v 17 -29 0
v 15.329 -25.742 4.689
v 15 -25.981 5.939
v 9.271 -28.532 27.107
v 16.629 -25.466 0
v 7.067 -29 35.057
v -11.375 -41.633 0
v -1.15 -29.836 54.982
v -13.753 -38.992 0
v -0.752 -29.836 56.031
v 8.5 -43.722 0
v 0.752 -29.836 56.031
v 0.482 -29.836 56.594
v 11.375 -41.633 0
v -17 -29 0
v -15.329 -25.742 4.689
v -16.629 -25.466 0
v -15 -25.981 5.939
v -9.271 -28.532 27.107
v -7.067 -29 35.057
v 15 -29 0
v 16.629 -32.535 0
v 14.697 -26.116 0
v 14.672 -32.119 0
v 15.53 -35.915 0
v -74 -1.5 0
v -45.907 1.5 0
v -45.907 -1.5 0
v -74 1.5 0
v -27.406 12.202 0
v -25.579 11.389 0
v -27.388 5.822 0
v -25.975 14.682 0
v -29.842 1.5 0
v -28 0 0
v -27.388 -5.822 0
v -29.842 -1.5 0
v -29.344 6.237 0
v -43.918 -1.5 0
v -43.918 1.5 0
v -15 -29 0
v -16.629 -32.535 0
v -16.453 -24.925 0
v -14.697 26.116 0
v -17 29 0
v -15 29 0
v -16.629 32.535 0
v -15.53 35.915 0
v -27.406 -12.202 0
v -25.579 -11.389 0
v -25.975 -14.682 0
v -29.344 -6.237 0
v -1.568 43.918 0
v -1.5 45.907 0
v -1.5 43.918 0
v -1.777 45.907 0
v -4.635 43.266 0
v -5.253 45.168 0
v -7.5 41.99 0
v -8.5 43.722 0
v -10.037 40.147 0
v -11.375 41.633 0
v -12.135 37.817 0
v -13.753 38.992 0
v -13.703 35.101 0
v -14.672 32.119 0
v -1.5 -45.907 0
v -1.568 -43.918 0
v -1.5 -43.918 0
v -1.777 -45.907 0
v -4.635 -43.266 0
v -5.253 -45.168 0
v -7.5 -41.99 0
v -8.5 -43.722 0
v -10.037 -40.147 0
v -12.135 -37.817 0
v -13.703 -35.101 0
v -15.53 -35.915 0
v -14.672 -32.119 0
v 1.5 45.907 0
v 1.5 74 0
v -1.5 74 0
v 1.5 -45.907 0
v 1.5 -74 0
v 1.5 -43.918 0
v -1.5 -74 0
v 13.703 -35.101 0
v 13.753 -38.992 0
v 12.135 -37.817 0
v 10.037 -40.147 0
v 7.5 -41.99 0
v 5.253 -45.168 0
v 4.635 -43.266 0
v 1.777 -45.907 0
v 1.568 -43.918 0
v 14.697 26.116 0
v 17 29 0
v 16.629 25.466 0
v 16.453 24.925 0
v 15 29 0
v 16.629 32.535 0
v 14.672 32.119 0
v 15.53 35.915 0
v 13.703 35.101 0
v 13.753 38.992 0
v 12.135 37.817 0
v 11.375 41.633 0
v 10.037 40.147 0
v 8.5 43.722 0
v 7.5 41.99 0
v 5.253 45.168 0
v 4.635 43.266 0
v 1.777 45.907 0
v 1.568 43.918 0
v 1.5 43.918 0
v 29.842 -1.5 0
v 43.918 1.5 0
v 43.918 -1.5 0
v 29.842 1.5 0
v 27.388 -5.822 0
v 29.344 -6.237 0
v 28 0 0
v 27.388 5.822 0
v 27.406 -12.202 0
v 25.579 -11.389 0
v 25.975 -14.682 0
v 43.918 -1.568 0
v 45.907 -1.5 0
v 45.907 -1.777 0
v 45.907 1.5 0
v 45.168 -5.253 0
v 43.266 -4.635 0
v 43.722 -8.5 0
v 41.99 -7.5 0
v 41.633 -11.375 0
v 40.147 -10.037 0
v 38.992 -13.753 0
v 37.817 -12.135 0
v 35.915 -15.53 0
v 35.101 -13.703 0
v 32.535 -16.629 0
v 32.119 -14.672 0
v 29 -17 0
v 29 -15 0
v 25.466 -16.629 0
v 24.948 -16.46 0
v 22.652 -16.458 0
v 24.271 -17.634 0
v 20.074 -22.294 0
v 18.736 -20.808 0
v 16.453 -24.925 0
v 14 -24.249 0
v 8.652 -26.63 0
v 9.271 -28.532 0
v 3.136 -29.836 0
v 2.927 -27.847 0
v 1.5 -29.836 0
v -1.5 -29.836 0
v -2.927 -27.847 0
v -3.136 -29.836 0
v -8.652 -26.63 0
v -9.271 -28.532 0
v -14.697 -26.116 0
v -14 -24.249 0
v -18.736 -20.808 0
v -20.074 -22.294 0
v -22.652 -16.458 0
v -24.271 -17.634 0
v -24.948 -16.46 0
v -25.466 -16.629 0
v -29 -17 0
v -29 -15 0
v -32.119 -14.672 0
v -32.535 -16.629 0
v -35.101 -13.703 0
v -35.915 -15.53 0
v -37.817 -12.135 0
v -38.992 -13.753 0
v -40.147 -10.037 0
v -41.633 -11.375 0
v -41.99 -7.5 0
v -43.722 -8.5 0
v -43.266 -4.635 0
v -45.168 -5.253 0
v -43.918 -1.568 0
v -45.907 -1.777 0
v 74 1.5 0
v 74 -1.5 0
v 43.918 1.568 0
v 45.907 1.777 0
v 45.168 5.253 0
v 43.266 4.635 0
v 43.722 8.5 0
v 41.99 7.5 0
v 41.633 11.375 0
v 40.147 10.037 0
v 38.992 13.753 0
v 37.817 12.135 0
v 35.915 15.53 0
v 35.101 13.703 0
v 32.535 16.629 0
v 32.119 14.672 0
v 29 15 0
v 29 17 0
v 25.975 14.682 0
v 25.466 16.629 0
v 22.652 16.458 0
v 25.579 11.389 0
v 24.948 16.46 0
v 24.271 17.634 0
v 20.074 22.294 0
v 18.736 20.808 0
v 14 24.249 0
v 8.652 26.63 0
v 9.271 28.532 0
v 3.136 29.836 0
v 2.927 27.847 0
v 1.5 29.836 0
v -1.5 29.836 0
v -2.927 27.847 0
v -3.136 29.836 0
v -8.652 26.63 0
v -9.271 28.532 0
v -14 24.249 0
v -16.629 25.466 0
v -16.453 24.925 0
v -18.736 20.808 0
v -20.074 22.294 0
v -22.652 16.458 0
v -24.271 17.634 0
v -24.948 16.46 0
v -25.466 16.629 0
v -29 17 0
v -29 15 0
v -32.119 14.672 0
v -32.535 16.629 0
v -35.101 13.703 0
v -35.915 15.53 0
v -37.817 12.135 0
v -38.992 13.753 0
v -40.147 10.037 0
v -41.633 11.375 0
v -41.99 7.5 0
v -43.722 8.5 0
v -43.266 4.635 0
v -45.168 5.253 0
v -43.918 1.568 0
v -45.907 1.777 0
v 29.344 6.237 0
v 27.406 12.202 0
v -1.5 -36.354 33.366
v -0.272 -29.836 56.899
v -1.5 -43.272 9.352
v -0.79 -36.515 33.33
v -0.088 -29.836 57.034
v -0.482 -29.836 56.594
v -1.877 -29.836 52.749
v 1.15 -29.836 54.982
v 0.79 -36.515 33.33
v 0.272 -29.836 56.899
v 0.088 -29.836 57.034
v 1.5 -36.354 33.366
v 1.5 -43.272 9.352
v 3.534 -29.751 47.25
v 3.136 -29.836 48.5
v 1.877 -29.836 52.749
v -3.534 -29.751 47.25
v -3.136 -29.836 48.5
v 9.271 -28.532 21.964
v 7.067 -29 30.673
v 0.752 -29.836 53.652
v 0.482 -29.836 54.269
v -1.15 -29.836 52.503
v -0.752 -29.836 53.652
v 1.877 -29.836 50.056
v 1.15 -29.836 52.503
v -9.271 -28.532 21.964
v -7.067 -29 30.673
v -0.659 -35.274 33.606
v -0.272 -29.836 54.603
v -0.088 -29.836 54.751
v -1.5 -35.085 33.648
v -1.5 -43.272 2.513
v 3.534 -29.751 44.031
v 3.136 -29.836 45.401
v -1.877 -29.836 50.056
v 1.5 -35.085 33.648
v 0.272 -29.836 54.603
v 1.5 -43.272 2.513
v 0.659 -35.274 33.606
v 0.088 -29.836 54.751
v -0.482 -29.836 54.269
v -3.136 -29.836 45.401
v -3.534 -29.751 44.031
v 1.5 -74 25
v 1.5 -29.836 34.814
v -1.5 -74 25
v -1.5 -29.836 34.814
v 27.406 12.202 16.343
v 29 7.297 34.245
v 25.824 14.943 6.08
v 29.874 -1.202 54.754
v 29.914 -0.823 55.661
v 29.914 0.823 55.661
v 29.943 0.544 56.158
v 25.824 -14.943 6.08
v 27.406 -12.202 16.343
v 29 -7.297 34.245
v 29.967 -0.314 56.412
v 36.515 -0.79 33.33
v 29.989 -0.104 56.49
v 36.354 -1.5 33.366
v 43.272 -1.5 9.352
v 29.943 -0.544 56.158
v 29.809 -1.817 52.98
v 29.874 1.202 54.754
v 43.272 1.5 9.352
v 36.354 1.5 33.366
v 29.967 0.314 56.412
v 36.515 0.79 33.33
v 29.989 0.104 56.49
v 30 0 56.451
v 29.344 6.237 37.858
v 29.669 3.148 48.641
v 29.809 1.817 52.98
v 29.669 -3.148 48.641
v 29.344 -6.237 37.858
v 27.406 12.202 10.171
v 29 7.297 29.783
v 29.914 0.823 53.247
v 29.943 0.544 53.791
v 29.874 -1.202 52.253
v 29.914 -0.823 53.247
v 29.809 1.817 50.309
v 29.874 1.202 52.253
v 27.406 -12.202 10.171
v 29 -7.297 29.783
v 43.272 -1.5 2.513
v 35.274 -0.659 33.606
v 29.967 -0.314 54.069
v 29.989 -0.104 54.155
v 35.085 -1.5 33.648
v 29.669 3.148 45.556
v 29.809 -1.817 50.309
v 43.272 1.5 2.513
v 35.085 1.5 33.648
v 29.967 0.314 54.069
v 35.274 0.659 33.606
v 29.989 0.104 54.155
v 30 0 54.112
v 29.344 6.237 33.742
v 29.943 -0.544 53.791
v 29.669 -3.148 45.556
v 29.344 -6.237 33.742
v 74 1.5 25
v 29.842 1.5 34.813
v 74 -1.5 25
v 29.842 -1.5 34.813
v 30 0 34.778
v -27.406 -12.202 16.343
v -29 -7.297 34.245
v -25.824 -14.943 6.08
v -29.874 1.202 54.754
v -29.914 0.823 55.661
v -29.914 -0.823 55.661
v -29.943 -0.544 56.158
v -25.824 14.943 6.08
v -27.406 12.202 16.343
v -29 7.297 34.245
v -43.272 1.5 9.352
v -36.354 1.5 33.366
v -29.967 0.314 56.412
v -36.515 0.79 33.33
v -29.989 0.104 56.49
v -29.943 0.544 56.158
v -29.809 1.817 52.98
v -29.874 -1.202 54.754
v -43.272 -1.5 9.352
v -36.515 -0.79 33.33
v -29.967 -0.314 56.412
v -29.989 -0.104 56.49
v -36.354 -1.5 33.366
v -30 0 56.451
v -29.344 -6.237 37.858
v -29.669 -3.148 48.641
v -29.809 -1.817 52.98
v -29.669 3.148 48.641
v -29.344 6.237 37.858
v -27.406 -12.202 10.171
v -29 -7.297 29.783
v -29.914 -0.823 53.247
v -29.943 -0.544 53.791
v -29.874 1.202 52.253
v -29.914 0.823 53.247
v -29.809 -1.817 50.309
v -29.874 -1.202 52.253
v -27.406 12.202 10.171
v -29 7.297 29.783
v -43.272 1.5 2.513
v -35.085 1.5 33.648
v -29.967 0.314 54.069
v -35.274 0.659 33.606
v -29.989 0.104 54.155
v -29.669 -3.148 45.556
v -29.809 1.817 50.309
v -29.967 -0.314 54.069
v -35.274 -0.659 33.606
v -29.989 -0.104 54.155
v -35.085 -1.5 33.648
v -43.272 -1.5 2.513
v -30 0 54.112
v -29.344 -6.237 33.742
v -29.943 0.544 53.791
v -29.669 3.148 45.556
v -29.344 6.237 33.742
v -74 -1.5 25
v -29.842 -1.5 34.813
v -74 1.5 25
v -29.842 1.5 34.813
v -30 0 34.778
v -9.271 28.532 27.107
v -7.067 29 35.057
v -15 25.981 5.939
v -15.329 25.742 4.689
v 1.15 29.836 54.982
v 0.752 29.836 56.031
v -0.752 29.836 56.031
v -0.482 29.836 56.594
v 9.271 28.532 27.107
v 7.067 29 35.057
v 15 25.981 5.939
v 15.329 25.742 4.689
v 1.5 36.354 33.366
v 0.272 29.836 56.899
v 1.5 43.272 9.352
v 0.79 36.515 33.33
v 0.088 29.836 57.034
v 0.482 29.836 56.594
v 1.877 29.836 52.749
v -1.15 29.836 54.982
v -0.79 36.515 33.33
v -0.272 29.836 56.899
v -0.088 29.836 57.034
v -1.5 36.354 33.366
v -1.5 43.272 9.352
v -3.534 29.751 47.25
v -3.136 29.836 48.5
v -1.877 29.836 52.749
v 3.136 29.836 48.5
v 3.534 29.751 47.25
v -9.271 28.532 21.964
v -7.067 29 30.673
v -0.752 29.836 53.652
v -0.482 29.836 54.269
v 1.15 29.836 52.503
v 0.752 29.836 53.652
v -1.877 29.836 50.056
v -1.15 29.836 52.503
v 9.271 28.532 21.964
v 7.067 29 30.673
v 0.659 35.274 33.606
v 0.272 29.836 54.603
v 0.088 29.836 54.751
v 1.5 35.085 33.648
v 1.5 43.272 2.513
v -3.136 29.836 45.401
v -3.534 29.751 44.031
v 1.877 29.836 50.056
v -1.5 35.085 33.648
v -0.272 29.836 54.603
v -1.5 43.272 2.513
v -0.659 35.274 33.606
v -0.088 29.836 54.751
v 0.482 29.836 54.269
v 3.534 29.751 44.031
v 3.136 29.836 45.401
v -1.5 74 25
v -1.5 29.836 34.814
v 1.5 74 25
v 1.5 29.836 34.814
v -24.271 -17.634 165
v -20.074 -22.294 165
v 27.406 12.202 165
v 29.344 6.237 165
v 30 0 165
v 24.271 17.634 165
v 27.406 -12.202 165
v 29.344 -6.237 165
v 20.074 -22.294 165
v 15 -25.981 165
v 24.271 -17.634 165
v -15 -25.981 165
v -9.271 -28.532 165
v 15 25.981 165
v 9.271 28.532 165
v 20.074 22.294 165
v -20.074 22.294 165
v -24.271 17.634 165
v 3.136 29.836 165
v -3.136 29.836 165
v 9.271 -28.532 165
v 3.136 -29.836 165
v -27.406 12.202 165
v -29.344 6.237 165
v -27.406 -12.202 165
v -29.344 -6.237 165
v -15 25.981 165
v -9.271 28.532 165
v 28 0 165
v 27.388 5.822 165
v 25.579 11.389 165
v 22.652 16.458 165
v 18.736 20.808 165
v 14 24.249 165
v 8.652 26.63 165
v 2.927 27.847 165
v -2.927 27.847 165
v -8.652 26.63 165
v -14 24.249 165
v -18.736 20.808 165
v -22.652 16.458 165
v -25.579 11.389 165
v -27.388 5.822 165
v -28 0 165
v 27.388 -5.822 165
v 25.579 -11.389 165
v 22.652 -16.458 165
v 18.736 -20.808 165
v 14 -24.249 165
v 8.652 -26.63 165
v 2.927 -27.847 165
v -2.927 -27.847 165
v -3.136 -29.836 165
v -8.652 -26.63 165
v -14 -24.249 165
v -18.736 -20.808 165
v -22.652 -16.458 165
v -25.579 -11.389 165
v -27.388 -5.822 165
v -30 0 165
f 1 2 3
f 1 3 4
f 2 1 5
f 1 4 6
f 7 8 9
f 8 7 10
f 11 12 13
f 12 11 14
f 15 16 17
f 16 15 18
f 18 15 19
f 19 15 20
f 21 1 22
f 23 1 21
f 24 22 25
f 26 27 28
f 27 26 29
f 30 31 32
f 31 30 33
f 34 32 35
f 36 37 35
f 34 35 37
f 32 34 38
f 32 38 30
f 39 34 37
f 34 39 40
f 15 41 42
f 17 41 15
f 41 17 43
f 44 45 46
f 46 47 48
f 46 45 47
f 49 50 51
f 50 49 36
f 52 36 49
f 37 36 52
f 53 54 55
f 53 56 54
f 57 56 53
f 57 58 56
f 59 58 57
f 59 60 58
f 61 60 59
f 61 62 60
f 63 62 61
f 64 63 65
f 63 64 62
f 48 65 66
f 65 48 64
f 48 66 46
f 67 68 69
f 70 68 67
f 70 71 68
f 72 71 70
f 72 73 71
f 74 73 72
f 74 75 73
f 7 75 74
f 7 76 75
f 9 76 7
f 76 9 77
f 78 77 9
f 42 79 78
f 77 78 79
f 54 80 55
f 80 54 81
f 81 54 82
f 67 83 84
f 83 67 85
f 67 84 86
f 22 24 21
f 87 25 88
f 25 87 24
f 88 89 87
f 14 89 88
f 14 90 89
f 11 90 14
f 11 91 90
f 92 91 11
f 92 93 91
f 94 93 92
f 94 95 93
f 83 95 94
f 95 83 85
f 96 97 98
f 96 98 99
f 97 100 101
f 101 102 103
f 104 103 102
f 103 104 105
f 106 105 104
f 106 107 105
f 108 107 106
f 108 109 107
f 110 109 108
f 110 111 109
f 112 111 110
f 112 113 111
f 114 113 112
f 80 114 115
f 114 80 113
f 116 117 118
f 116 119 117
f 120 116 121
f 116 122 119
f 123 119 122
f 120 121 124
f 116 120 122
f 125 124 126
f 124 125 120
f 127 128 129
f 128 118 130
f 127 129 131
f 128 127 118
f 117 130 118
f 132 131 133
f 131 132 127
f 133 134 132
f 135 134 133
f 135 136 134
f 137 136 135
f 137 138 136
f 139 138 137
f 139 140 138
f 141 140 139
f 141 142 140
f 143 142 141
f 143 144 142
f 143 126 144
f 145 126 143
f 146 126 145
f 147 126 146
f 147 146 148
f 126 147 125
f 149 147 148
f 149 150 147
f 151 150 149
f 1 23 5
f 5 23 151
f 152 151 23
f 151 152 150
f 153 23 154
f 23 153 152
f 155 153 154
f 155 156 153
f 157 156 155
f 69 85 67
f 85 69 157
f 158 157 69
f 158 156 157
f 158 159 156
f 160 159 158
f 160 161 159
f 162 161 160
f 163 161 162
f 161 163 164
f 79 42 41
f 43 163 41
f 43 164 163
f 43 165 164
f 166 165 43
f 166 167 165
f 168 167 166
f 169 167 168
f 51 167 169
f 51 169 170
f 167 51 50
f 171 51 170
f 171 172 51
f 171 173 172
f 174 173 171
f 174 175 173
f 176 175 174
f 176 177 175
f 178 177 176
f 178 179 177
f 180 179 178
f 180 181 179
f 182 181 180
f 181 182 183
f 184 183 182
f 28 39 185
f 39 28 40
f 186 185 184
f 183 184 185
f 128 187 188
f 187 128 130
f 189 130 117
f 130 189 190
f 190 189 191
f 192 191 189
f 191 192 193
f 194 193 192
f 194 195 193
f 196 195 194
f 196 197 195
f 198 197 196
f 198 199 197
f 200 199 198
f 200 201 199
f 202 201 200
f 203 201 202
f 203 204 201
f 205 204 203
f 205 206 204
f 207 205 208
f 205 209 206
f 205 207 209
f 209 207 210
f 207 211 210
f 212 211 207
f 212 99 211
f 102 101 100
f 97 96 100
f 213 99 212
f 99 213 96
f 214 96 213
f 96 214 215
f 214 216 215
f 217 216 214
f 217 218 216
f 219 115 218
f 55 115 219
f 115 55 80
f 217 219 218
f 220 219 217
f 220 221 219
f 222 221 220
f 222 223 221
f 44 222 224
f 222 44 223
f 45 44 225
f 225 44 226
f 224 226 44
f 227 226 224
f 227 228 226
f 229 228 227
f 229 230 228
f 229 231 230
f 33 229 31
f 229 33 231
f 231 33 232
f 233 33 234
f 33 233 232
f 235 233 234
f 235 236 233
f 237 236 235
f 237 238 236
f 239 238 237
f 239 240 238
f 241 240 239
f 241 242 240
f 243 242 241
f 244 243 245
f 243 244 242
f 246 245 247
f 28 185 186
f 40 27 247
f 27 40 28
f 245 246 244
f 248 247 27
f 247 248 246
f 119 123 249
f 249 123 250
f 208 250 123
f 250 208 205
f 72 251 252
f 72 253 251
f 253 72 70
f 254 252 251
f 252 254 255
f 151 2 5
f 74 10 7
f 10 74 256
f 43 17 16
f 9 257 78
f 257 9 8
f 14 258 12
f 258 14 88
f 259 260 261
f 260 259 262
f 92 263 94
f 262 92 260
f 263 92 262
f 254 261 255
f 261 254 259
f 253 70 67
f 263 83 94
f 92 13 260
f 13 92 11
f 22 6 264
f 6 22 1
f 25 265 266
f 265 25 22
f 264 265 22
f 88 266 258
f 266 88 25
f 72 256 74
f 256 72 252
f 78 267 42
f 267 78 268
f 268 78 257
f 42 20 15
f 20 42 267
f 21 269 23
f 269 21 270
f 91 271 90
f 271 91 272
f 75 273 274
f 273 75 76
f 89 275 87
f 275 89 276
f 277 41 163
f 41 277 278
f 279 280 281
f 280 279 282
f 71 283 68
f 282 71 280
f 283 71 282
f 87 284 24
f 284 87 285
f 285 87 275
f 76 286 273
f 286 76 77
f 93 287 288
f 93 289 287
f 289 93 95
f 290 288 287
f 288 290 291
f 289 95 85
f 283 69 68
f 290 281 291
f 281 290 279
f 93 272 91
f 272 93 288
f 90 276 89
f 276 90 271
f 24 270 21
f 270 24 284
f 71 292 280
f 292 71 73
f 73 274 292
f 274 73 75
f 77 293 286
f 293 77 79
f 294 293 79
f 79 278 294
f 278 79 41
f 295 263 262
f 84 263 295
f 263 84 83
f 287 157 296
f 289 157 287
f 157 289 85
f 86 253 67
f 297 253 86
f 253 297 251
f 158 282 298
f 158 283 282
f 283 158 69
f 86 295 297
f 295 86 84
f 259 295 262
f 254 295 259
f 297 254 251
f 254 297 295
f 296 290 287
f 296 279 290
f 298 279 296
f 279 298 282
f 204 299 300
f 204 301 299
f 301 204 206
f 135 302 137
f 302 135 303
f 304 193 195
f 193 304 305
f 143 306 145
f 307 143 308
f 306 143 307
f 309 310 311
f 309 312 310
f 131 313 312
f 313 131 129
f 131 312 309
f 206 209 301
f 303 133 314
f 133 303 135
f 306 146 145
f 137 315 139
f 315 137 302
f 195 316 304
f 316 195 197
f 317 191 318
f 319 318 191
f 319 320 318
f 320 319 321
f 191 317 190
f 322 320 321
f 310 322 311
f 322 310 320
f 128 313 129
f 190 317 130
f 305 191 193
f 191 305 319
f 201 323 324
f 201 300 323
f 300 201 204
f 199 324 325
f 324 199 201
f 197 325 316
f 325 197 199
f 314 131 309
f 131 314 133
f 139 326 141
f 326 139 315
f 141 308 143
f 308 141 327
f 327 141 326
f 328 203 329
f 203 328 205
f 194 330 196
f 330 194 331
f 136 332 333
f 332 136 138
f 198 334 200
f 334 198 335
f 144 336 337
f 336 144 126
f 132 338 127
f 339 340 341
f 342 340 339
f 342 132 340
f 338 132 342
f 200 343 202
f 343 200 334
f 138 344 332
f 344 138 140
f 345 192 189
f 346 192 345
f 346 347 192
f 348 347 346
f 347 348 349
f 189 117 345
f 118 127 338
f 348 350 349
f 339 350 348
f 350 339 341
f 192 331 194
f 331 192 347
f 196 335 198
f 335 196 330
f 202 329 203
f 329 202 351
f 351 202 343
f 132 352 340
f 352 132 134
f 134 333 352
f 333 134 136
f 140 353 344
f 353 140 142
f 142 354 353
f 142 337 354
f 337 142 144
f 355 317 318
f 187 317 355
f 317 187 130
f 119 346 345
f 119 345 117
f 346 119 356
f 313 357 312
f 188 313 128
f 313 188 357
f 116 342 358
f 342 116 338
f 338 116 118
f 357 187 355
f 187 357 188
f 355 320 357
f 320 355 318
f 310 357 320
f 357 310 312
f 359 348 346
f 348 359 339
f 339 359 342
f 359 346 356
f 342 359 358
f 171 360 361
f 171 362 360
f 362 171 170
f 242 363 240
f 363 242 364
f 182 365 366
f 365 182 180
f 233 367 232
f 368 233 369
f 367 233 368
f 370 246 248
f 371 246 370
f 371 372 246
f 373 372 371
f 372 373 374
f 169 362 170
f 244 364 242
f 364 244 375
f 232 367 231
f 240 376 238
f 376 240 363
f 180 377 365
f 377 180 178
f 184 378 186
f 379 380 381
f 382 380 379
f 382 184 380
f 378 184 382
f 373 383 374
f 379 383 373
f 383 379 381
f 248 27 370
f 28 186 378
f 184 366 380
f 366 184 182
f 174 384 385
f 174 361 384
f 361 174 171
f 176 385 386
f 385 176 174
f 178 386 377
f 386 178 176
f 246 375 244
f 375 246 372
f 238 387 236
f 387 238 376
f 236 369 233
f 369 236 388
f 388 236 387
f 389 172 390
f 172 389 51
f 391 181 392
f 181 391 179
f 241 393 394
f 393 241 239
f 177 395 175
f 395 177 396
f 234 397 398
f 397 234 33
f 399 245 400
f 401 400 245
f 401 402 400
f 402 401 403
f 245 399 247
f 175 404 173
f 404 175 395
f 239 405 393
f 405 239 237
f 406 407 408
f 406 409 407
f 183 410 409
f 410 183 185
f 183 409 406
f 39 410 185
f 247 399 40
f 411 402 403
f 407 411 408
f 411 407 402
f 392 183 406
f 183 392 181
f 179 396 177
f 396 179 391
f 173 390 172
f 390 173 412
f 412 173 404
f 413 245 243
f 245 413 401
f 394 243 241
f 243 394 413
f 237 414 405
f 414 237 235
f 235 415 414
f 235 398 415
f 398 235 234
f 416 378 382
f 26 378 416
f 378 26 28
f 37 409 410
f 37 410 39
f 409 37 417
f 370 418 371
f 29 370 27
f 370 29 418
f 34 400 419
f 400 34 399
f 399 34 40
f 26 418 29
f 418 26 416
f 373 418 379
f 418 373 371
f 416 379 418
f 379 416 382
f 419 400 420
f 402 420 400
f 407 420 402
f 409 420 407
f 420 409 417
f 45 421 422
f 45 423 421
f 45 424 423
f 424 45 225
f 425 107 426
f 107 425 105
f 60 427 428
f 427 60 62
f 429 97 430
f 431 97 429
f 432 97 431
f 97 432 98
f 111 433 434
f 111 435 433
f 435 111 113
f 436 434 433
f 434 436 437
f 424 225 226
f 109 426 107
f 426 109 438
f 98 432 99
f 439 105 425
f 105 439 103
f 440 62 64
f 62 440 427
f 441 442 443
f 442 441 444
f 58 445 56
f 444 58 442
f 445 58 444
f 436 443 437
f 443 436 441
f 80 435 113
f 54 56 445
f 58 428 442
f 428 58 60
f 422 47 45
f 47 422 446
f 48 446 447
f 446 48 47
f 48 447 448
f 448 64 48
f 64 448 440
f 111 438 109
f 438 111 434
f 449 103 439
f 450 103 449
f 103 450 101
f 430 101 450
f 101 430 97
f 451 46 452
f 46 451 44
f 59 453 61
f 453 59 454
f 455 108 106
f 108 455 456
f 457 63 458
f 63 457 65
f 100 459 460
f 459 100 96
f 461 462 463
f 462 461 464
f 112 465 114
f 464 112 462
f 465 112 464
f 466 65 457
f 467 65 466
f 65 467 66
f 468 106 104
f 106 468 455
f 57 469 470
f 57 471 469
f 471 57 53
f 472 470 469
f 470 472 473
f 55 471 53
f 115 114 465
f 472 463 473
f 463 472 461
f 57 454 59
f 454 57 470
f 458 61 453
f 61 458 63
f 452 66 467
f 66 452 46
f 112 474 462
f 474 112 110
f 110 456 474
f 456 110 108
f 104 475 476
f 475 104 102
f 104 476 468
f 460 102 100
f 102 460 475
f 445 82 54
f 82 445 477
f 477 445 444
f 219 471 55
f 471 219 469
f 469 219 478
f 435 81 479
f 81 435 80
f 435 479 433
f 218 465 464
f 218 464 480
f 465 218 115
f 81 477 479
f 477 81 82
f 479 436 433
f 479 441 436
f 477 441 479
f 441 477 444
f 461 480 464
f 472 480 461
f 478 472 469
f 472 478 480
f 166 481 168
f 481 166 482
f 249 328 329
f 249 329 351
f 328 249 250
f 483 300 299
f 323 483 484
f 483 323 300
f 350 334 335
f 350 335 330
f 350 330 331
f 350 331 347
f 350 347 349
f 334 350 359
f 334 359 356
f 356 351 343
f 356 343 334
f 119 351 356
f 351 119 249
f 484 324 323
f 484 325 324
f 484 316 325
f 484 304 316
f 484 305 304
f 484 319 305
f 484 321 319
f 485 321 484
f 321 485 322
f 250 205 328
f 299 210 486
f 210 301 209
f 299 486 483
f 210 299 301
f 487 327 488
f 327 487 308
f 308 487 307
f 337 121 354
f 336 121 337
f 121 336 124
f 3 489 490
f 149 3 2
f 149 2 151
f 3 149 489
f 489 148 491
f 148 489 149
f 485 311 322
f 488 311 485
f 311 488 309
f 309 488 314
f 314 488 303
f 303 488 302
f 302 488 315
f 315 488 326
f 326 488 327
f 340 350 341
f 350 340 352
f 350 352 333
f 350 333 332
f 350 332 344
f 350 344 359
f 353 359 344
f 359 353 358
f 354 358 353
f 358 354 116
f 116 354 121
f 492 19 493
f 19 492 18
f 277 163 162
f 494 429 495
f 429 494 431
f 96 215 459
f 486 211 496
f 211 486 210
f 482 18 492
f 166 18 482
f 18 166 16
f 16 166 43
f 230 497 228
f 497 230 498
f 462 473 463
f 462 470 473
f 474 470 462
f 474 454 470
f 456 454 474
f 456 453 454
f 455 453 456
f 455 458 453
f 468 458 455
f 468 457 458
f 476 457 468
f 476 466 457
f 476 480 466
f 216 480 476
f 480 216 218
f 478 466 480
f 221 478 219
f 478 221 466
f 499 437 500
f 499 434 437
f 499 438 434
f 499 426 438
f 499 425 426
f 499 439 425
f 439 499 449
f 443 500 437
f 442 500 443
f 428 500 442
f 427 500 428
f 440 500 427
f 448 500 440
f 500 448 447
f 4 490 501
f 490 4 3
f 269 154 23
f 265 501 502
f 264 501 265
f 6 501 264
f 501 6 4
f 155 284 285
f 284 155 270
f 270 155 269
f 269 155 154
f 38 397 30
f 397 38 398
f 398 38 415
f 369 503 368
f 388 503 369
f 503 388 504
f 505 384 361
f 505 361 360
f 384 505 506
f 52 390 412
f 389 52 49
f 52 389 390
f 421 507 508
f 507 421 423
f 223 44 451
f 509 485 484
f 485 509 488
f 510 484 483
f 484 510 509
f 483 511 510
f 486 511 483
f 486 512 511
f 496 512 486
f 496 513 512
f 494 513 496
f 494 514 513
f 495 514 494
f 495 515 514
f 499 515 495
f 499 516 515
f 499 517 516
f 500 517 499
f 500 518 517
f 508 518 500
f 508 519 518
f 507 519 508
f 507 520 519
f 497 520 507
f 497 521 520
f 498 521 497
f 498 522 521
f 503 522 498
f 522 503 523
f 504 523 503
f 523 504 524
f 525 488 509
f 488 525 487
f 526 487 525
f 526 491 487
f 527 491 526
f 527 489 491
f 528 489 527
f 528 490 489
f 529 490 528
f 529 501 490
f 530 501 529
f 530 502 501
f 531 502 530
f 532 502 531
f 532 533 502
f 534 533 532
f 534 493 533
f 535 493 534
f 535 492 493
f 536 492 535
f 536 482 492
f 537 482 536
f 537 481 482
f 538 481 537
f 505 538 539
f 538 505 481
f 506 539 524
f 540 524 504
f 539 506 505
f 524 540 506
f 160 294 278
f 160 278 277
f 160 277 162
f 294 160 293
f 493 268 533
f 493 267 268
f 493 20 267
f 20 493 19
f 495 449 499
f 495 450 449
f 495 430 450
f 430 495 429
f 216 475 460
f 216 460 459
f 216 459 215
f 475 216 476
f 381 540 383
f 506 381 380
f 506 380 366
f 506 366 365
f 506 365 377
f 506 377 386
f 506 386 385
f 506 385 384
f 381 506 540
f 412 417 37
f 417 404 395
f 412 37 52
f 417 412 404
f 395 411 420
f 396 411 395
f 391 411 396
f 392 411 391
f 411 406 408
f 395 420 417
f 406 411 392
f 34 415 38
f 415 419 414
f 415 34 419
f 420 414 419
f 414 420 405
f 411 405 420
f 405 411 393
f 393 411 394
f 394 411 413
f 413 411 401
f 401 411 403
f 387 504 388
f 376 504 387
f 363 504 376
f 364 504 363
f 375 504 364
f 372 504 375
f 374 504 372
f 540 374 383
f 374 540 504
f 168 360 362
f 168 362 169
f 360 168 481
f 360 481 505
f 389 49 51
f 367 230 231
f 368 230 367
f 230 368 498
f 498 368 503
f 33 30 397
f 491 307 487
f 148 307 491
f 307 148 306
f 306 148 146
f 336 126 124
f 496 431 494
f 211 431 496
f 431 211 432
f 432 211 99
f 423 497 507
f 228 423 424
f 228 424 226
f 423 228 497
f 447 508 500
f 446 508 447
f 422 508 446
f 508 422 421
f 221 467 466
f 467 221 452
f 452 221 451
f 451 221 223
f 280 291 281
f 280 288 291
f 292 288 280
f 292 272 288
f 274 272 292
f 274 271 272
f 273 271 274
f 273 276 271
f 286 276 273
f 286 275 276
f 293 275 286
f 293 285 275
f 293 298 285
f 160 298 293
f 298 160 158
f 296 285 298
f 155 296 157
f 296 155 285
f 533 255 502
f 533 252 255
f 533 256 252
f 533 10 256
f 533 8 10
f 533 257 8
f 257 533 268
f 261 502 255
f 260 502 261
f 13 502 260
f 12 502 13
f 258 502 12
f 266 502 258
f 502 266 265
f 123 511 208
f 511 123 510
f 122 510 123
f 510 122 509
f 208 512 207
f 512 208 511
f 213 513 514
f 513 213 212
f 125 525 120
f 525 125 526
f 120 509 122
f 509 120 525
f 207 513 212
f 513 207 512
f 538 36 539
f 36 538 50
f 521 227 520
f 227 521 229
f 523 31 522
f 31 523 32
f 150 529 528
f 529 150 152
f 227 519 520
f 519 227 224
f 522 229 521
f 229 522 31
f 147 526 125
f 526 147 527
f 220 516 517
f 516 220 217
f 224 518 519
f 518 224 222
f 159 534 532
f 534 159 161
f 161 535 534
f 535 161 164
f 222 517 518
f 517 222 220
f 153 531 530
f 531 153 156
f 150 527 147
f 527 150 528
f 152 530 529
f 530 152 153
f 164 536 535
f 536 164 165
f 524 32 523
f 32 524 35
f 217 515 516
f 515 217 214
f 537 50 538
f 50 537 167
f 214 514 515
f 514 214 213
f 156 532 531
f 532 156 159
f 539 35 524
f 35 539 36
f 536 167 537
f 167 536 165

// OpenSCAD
$fn = 30;
module prism(l, w, h){
    polyhedron(
        points=[[0,0,0], [l,0,0], [l,w,0], [0,w,0], [0,w,h], [l,w,h]],
        faces=[[0,1,2,3],[5,4,3,2],[0,4,5,1],[0,3,4],[5,2,1]]
    );
}

difference() {
union() {
        translate([0, -29, 0]) {
            difference() {
            cylinder(r1 = 17, r2 = 0, h = 60);
            cylinder(r1 = 15, r2 = 0, h = 58);
            }
            translate([ 0, -45, 0]) {
                translate([-1.5, 0, 0]) {
                    cube([3, 45, 25], center = false);
                }
                translate([ -1.5, 0, 25]) {
                    prism( 3, 45, 10);
                }
            }
        }
        translate([29, 0, 0]) {
            rotate([ 0, 0, 90]) {
                difference() {
                    cylinder(r1 = 17, r2 = 0, h = 60);
                    cylinder(r1 = 15, r2 = 0, h = 58);
                }
                translate([ 0, -45, 0]) {
                    translate([-1.5, 0, 0]) {
                        cube([3, 45, 25], center = false);
                    }
                    translate([ -1.5, 0, 25]) {
                        prism( 3, 45, 10);
                    }
                }
            }
        }
        translate([-29, 0, 0]) {
            rotate([ 0, 0, -90]) {
                difference() {
                    cylinder(r1 = 17, r2 = 0, h = 60);
                    cylinder(r1 = 15, r2 = 0, h = 58);
                }
                translate([ 0, -45, 0]) {
                    translate([-1.5, 0, 0]) {
                        cube([3, 45, 25], center = false);
                    }
                    translate([ -1.5, 0, 25]) {
                        prism( 3, 45, 10);
                    }
                }
            }
        }
        translate([0, 29, 0]) {
            rotate([ 0, 0, 180]) {
                difference() {
                    cylinder(r1 = 17, r2 = 0, h = 60);
                    cylinder(r1 = 15, r2 = 0, h = 58);
                }
                translate([ 0, -45, 0]) {
                    translate([-1.5, 0, 0]) {
                        cube([3, 45, 25], center = false);
                    }
                    translate([ -1.5, 0, 25]) {
                        prism( 3, 45, 10);
                    }
                }
            }
        }
    cylinder(r = 30, h = 165);
    }
    cylinder(r = 28, h = 165);
}
    
